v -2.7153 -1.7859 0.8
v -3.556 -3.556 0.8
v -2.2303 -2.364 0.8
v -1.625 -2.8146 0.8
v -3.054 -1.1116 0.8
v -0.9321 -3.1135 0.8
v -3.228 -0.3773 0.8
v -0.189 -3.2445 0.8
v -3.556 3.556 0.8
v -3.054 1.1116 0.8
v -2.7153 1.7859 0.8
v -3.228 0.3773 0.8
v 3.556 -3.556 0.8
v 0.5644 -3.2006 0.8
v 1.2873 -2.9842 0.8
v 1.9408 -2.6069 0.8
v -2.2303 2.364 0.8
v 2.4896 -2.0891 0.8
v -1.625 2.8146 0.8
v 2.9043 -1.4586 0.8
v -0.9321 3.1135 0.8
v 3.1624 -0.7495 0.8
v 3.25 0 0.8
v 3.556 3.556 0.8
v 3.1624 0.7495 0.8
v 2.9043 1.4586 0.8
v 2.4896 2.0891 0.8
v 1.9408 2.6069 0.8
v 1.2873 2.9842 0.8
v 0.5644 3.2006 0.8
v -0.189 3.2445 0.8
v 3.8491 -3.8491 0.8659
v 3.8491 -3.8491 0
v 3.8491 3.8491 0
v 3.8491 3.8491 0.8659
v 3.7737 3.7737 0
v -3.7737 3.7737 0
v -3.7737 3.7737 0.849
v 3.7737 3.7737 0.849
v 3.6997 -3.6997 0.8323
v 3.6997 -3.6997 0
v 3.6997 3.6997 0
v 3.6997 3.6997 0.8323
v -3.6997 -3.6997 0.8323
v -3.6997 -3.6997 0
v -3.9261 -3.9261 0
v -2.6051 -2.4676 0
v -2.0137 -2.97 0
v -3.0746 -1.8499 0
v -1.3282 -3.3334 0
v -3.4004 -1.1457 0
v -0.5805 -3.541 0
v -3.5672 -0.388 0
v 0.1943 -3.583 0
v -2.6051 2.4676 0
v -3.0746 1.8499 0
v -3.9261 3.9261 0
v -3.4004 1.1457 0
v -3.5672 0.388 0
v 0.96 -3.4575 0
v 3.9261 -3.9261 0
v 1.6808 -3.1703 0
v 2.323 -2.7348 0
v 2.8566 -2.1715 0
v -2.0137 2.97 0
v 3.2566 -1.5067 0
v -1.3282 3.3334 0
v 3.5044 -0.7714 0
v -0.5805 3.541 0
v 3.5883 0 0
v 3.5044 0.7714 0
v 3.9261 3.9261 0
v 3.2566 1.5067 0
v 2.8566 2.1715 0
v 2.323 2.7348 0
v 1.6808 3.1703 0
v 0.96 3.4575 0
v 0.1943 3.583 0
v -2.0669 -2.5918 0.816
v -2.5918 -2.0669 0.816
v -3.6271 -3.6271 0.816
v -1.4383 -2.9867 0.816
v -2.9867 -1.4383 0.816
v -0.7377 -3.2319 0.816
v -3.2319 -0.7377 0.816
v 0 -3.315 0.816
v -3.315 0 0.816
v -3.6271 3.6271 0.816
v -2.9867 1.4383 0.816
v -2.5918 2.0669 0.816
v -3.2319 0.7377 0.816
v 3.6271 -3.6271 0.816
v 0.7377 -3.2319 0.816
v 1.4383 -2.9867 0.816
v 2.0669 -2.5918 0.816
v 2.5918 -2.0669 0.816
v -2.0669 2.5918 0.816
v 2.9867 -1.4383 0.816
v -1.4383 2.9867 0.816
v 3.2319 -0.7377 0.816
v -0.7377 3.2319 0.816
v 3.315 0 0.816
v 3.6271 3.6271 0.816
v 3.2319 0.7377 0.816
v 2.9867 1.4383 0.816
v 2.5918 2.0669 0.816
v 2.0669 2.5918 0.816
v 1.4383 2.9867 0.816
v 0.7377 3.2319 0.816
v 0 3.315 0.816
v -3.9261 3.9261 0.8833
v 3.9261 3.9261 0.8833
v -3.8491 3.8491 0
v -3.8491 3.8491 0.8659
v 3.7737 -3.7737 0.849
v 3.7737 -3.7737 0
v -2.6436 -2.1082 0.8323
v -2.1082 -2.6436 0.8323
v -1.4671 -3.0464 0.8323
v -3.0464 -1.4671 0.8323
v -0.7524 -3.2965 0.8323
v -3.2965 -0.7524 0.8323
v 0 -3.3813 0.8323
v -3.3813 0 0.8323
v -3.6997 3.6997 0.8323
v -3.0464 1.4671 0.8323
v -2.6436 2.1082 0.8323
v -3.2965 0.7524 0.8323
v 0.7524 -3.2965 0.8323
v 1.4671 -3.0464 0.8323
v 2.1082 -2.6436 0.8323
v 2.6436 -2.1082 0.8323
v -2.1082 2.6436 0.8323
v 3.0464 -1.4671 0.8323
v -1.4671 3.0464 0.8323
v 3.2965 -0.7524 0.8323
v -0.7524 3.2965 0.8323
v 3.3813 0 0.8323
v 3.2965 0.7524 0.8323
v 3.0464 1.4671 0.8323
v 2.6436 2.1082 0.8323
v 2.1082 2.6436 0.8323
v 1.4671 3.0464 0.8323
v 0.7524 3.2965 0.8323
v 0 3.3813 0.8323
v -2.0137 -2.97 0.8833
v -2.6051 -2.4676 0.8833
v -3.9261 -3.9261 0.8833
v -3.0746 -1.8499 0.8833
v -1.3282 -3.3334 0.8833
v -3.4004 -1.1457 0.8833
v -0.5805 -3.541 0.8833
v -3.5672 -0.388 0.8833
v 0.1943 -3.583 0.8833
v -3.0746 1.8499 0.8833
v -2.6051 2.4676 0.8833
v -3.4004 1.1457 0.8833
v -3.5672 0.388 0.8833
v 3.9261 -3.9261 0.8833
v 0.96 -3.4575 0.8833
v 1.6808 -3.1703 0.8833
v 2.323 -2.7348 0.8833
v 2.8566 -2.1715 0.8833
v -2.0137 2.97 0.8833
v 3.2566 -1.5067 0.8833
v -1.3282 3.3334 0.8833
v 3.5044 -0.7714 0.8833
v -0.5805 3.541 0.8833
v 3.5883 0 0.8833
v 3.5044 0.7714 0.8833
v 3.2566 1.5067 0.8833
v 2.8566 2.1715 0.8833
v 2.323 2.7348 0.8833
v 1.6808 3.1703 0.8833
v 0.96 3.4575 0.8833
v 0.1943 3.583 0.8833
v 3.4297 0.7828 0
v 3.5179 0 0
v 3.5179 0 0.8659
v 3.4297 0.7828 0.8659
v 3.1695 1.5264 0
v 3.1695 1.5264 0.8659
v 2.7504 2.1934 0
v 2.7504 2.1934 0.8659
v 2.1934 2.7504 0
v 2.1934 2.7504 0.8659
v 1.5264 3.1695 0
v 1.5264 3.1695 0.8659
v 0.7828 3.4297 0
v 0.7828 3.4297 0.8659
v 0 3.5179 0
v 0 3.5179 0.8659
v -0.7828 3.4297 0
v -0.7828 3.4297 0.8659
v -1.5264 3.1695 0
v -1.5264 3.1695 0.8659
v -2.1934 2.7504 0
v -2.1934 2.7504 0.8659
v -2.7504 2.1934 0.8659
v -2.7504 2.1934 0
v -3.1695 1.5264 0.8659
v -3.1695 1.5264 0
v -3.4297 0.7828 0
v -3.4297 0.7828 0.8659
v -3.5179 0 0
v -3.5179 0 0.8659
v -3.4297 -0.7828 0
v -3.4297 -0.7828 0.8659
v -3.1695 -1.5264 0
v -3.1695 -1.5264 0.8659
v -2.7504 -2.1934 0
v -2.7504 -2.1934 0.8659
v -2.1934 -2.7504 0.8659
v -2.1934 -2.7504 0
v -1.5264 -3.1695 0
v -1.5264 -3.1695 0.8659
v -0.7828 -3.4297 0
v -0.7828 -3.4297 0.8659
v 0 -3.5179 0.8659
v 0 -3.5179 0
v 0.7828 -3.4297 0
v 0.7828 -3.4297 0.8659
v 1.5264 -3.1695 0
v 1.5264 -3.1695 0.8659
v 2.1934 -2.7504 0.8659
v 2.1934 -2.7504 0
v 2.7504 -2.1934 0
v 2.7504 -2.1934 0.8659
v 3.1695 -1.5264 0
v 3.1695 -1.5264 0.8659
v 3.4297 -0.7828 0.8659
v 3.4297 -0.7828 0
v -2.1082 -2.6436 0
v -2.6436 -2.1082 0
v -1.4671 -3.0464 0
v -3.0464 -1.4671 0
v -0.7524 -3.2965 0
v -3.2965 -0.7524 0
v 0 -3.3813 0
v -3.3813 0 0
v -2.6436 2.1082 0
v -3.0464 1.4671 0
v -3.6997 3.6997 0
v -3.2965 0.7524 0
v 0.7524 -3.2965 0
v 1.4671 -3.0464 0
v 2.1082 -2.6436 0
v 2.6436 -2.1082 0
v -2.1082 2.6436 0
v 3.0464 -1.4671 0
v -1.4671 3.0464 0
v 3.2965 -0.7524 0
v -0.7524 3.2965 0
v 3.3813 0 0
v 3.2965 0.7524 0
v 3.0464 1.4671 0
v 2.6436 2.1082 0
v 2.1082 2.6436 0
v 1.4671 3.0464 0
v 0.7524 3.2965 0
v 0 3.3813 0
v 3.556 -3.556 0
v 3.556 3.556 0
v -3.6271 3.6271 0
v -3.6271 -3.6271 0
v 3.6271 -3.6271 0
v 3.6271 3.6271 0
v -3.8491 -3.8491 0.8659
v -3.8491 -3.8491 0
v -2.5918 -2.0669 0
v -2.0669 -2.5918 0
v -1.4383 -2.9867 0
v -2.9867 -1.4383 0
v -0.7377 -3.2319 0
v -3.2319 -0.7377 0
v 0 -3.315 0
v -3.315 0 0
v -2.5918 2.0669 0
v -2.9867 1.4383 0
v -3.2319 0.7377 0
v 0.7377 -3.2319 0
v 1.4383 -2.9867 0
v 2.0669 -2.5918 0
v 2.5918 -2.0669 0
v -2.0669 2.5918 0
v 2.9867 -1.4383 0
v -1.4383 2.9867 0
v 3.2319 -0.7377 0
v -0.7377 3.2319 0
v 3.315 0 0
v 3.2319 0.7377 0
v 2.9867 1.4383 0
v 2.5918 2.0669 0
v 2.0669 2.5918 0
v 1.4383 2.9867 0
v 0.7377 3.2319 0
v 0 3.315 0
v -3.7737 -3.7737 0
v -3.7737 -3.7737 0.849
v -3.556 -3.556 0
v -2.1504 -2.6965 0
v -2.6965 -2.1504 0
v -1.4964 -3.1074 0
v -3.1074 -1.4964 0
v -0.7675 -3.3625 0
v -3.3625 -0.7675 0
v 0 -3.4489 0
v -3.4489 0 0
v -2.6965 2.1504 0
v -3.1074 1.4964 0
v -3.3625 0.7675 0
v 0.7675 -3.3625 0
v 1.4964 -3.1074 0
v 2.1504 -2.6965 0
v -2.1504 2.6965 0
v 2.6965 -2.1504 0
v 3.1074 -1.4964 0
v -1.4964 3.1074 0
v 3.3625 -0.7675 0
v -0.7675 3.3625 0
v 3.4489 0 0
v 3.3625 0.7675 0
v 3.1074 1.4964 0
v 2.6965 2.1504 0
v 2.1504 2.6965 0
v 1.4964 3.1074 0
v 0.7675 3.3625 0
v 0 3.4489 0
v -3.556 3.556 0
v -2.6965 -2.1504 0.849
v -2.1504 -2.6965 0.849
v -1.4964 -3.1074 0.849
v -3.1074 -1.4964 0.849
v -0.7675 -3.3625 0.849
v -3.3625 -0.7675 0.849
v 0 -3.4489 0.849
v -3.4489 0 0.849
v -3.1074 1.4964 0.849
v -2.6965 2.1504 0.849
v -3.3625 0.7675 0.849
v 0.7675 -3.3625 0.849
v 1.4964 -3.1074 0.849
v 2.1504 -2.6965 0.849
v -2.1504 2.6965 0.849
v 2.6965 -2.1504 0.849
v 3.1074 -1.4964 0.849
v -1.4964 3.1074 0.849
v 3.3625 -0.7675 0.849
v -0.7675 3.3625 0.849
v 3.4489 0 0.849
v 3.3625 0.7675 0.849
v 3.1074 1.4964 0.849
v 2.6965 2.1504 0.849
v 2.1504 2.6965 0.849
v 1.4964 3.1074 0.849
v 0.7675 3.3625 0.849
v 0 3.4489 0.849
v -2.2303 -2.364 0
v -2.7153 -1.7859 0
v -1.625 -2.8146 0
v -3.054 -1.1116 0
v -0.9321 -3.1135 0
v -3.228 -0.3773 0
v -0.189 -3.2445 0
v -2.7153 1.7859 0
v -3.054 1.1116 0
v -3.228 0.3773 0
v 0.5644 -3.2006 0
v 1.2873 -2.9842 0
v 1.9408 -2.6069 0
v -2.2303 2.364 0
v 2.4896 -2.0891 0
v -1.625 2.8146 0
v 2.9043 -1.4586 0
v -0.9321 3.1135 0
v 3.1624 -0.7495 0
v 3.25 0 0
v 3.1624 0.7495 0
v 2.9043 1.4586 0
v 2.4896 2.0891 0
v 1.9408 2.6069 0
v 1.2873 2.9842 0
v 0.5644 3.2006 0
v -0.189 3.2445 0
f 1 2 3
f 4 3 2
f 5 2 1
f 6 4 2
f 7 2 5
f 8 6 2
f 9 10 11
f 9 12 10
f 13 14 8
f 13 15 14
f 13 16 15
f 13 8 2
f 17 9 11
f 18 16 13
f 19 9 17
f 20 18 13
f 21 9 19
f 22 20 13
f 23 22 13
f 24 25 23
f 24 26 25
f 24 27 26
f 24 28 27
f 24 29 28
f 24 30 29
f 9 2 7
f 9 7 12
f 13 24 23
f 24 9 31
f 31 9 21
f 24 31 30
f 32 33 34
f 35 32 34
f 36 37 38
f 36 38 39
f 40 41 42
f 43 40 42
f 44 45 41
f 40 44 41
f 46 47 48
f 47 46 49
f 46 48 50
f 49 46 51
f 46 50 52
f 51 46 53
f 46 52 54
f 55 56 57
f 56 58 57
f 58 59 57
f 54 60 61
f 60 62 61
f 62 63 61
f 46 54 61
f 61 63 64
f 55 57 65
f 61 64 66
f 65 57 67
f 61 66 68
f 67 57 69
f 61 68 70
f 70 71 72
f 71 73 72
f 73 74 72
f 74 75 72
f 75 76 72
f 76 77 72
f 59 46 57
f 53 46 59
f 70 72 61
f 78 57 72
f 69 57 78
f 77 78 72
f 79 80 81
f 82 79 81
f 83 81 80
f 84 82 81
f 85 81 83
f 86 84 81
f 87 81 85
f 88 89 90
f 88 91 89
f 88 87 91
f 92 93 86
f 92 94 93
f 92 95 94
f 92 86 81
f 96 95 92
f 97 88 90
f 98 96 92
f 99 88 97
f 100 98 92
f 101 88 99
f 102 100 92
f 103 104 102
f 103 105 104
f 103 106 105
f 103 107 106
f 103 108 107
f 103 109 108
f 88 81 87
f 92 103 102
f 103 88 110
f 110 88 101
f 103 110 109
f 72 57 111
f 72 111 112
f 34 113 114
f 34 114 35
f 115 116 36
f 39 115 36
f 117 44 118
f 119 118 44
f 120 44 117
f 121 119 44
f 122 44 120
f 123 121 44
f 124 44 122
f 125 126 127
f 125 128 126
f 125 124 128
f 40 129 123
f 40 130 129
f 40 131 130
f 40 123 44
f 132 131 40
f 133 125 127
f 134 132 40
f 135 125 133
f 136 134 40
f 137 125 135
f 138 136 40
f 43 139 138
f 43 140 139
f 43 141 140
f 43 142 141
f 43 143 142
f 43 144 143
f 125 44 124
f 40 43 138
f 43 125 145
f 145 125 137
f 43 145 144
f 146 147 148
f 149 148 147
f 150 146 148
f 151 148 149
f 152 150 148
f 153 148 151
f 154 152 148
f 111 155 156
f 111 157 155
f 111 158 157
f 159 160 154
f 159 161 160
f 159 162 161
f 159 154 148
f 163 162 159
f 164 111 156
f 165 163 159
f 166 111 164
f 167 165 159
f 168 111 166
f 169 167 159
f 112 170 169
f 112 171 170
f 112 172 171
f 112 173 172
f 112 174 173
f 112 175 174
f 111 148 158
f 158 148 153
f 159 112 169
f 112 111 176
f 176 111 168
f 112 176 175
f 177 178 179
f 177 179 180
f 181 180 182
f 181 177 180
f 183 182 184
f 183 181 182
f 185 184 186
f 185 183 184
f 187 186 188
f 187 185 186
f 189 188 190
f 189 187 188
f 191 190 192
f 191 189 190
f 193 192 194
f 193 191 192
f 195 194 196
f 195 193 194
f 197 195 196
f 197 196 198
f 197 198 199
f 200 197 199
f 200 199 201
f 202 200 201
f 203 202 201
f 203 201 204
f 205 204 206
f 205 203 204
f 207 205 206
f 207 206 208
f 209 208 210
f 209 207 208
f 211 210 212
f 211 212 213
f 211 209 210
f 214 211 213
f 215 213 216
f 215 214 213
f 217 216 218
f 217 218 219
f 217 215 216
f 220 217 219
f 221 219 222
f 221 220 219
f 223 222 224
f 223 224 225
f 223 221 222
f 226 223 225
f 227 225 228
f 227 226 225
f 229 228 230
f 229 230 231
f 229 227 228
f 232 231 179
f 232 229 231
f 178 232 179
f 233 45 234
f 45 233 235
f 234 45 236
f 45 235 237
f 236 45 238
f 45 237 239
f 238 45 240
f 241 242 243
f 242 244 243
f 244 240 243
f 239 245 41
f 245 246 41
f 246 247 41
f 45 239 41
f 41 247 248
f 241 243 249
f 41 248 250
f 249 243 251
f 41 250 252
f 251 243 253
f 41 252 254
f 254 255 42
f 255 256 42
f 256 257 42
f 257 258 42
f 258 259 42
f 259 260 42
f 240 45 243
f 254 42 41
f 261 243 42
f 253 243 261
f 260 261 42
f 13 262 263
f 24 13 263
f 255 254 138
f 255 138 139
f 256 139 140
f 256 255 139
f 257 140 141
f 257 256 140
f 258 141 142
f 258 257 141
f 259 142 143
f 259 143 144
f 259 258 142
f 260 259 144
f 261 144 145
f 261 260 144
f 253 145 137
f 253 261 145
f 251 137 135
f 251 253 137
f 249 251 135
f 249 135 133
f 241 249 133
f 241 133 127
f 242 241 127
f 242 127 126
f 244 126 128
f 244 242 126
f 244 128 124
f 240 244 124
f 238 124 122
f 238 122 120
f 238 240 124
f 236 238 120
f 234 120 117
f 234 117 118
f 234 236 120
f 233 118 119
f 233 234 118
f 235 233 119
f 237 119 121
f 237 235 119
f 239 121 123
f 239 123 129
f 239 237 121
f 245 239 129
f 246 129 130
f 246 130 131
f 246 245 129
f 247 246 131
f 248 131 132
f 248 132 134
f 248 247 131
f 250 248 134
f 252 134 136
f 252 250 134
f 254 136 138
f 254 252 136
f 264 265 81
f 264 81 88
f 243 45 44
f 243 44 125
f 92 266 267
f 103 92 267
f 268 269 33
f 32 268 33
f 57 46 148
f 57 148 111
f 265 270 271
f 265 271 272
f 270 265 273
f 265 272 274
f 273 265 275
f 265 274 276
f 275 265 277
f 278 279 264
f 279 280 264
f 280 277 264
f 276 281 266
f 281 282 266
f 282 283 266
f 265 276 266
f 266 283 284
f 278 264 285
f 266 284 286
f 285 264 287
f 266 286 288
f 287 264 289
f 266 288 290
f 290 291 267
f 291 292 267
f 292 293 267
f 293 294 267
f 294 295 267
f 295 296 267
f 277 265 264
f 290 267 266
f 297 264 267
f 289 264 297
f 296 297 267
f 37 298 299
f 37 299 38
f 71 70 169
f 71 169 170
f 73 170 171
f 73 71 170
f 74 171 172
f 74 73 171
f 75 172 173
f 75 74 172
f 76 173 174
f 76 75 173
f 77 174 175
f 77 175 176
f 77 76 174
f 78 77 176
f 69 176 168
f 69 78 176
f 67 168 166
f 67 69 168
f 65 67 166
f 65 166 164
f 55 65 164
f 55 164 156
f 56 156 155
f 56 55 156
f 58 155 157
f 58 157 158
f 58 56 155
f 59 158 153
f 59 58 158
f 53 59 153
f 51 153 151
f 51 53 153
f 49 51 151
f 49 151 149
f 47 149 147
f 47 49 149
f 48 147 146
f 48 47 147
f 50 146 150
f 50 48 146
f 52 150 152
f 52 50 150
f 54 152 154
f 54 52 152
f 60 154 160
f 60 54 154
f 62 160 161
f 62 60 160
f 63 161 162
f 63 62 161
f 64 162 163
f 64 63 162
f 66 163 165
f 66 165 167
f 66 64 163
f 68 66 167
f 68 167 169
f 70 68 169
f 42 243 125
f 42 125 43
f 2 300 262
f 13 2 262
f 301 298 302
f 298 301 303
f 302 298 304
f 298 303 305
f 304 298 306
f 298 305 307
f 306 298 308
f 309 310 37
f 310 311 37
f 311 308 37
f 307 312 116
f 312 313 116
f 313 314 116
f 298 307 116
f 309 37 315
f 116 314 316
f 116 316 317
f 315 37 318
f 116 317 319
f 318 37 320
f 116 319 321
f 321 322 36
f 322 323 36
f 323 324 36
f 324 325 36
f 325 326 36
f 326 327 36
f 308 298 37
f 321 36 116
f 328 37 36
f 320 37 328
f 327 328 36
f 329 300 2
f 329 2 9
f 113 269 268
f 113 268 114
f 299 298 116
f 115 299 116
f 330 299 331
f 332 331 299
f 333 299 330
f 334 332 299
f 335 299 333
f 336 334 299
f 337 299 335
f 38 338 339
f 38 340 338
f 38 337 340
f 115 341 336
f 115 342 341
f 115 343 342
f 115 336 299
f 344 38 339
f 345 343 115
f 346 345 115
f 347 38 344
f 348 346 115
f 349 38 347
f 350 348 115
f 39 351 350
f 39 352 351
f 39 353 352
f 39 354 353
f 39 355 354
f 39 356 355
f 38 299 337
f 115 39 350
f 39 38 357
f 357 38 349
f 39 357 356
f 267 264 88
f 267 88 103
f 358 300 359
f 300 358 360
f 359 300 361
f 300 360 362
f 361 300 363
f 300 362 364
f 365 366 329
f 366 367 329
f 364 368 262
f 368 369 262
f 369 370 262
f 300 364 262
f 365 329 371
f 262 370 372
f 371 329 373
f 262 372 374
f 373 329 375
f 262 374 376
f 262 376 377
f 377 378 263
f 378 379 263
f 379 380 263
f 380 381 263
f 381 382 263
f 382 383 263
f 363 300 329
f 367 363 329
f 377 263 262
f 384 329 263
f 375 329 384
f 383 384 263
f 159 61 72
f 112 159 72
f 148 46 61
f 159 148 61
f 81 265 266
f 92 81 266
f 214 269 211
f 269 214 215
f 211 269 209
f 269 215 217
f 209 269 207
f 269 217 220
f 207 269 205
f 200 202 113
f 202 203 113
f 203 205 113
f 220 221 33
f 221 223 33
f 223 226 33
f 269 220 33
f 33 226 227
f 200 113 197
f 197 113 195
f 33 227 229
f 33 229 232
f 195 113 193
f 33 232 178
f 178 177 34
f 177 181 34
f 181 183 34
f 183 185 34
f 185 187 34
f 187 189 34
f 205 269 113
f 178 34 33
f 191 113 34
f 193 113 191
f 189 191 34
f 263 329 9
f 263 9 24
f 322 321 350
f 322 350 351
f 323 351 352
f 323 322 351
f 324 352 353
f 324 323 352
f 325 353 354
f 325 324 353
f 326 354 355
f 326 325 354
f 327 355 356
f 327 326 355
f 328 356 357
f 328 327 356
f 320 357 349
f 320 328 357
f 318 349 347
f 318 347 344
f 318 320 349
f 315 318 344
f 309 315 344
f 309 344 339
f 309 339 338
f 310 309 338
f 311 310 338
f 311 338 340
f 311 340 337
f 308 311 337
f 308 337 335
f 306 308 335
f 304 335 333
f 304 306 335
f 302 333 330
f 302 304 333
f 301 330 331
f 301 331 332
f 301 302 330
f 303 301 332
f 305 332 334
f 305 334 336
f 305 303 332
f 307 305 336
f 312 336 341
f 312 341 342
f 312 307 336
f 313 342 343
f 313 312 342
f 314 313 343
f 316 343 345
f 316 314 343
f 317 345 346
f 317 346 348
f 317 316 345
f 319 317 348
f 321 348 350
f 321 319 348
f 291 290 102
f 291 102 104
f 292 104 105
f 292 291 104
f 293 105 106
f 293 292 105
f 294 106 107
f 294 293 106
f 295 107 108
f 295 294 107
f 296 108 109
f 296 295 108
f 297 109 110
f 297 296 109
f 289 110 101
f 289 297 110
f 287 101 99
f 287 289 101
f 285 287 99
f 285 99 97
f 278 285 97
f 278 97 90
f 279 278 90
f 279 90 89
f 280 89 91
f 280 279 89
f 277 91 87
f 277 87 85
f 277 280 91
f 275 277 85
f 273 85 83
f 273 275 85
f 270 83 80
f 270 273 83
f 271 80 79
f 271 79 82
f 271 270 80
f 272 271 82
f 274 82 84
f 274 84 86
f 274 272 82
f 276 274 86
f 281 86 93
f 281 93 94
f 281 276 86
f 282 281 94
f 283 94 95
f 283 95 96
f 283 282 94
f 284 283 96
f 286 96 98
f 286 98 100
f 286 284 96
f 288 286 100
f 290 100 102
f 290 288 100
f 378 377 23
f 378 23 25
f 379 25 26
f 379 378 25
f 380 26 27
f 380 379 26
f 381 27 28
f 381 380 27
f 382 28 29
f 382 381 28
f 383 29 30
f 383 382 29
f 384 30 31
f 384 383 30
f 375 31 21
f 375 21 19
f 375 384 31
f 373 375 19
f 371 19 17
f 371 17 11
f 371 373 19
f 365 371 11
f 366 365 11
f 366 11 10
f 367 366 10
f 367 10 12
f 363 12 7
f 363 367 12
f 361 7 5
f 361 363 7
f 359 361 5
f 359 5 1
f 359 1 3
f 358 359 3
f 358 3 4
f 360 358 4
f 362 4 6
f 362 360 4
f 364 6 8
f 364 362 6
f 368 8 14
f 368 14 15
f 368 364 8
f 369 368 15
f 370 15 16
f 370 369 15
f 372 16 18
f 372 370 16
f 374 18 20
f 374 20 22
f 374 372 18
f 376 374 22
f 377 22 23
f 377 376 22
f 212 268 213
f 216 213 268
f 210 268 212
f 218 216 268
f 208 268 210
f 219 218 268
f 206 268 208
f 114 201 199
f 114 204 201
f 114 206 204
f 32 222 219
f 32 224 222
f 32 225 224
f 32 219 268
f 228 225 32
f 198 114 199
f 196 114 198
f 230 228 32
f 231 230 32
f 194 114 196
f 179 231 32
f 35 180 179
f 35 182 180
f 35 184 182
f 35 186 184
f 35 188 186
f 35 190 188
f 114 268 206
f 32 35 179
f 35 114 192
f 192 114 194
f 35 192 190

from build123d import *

# Parameters (mm, degrees)
F0_W     = 7.112
F0_H     = 7.112
F0_R     = 3.25
F1_DEPTH = 0.8
F2_SCALE = 1.02
F3_SCALE = 1.02
F4_SCALE = 1.02
F5_SCALE = 1.02
F6_SCALE = 1.02


with BuildPart() as f1:
    # F0 (on Top) → F1 (new body)
    with BuildSketch(Plane.XY):
        Rectangle(F0_W, F0_H)
        Circle(F0_R, mode=Mode.SUBTRACT)
    extrude(amount=F1_DEPTH)


with BuildPart() as f2_1:
    # F2: copy of F1
    add(f1.part.scale(F2_SCALE))


with BuildPart() as f3_1:
    # F3: copy of F2_1
    add(f2_1.part.scale(F3_SCALE))


with BuildPart() as f4_1:
    # F4: copy of F3_1
    add(f3_1.part.scale(F4_SCALE))


with BuildPart() as f5_1:
    # F5: copy of F4_1
    add(f4_1.part.scale(F5_SCALE))


with BuildPart() as f6_1:
    # F6: copy of F5_1
    add(f5_1.part.scale(F6_SCALE))


solid = Compound([f1.part, f2_1.part, f3_1.part, f4_1.part, f5_1.part, f6_1.part])
